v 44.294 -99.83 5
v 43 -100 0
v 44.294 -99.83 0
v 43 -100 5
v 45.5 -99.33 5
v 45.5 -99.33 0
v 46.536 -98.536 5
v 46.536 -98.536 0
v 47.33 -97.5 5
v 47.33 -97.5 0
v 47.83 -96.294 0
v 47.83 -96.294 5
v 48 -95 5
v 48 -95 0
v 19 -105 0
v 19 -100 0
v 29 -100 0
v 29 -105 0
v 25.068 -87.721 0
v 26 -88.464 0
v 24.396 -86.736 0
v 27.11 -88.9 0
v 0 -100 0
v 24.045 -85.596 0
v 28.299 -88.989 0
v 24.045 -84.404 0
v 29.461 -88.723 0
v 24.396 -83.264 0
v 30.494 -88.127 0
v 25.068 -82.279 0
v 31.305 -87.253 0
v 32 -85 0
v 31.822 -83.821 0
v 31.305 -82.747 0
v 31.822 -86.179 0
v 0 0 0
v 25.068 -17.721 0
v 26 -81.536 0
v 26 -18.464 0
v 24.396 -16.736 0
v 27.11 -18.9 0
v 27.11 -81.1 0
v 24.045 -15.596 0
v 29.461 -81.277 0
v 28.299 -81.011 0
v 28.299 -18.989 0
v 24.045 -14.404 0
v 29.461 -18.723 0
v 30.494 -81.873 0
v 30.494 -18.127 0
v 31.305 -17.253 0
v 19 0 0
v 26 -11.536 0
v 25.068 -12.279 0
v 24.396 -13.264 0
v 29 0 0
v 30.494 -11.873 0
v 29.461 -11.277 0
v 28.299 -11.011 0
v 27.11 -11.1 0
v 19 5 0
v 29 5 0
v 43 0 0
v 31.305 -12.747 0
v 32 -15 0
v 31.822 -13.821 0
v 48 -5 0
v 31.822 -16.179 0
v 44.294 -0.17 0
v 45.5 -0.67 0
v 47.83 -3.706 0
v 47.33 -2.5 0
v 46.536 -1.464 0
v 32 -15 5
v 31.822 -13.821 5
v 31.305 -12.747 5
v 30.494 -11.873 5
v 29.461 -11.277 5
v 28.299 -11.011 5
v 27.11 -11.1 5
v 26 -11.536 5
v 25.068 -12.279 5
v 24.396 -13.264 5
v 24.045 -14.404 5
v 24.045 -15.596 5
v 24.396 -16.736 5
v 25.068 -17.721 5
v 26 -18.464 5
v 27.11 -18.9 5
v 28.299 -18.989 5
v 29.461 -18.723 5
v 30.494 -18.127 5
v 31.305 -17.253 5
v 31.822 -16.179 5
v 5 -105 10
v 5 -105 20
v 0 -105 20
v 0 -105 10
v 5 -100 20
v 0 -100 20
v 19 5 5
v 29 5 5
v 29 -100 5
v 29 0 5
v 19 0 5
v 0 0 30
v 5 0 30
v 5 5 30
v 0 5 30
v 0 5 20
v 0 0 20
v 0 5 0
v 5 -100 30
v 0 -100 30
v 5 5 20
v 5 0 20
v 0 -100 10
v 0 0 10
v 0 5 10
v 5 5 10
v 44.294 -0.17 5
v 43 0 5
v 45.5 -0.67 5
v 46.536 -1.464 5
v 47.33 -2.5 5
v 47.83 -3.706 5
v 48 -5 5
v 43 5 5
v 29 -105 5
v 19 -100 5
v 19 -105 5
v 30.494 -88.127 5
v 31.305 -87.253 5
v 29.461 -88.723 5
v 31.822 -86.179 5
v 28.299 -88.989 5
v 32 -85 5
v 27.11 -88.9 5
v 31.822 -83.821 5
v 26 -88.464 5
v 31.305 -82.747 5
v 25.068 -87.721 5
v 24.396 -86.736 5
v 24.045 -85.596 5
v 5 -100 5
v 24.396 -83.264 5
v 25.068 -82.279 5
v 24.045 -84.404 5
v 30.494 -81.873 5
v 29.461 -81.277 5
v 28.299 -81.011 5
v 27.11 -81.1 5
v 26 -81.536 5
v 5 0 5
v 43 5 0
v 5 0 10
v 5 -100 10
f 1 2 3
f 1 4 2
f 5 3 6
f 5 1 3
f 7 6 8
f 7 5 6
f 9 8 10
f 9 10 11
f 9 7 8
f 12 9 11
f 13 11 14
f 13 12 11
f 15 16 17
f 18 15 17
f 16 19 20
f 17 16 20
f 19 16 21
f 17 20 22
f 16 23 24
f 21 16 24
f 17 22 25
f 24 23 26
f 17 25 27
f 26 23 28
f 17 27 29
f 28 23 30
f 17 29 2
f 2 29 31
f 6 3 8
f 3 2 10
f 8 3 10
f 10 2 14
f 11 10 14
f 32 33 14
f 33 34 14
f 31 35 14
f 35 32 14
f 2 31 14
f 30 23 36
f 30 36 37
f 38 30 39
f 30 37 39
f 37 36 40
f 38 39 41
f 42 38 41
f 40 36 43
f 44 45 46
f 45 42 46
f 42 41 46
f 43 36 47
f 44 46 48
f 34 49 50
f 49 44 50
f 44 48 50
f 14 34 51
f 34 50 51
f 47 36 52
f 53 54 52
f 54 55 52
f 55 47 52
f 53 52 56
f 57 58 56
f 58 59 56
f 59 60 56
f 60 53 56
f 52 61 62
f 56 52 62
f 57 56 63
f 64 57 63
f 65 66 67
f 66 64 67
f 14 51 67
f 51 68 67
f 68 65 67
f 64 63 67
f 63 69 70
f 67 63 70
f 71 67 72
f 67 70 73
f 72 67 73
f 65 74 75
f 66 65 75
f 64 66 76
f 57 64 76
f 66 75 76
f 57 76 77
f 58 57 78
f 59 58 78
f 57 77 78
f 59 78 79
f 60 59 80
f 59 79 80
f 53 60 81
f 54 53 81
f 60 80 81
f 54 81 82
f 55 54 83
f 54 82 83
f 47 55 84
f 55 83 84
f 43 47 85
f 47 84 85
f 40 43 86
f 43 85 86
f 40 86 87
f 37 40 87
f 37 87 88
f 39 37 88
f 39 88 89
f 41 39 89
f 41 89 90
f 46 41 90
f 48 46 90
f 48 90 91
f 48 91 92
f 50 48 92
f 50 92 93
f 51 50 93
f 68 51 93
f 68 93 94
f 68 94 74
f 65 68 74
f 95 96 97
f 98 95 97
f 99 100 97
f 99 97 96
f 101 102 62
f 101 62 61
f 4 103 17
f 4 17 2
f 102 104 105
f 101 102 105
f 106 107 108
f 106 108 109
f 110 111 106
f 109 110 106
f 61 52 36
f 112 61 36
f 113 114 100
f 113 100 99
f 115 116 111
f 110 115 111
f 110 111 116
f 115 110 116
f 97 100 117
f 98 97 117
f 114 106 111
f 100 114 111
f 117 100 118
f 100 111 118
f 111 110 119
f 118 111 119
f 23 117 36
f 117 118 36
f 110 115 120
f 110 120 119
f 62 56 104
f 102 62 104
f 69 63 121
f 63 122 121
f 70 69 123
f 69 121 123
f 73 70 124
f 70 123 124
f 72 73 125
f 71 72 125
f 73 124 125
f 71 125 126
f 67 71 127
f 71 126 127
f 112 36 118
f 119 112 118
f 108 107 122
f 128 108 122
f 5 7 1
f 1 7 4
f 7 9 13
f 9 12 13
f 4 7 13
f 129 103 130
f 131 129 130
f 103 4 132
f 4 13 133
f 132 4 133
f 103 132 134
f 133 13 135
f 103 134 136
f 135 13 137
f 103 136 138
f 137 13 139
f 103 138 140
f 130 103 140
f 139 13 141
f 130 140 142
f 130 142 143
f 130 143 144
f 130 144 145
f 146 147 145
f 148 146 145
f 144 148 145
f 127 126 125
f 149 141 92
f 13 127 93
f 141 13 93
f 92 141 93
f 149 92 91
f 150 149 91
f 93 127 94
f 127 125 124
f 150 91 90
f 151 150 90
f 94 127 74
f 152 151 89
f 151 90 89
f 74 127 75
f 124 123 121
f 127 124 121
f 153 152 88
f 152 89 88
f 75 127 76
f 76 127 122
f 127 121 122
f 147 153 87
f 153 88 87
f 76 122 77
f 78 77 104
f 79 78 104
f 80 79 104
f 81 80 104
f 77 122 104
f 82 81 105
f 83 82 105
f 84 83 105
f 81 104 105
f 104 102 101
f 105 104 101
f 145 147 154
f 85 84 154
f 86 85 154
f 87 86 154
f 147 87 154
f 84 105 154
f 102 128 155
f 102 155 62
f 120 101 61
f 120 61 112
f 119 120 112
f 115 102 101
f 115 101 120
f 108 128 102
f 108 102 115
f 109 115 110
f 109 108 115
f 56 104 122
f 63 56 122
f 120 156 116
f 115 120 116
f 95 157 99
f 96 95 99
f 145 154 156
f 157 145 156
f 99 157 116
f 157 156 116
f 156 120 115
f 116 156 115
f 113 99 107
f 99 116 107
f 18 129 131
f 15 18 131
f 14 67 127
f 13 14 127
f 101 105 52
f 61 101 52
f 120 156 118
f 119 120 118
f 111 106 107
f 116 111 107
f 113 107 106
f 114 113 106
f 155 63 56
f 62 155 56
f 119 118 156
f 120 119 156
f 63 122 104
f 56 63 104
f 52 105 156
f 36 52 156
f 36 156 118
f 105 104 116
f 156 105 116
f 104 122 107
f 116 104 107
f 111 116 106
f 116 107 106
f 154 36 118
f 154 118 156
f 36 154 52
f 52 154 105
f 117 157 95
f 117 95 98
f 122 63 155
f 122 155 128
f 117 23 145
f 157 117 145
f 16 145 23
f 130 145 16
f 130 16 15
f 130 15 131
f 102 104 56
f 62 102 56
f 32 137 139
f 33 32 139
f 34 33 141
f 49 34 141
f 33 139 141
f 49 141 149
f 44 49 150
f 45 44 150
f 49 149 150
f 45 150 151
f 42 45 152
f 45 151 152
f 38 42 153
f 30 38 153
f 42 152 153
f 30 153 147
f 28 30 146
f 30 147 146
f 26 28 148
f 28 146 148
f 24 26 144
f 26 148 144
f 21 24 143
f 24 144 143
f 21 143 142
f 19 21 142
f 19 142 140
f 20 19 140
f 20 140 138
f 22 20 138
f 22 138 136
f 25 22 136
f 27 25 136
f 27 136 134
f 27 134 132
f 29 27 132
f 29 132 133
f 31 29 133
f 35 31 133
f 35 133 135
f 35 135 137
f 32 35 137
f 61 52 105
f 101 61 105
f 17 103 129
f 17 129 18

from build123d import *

# Parameters (mm, degrees)
F1_DEPTH = 100
F2_R     = 4
F3_DEPTH = 25
F4_R     = 5
F6_DEPTH = 5
F8_W     = 5
F8_H     = 10
F8_W_2   = 14
F8_H_2   = 5
F9_DEPTH = 5


# Not quite as in the source:
# - a pattern or mirror of a feature is missing from the dataset's text; its kind, count and spacing are read off the source's solid


with BuildPart() as f1:
    # F0 (on Front) → F1 (new body)
    with BuildSketch(Plane.XZ):
        Polygon((0, 30), (0, 0), (48, 0), (48, 5), (5, 5), (5, 30), align=None)
    extrude(amount=F1_DEPTH)

    # F2 (on face) → F3 (cut)
    with BuildSketch(Plane.XY.offset(5)):
        with Locations((28, -85)):
            Circle(F2_R)
        with Locations((28, -15)):
            Circle(F2_R)
    extrude(amount=-F3_DEPTH, mode=Mode.SUBTRACT)

    # F4
    f4_edges = [f1.edges().sort_by_distance(p)[0] for p in [
        (48, -100, 2.5),
        (48, 0, 2.5),
    ]]
    fillet(f4_edges, radius=F4_R)

    # F5 (on face) → F6 (join)
    with BuildSketch(Plane(origin=(0, 0, 0), x_dir=(-1, 0, 0), z_dir=(0, 1, 0))):
        Polygon((0, 10), (0, 15), (0, 20), (-5, 20), (-5, 10), align=None)
        Polygon((-19, 5), (-24, 5), (-29, 5), (-29, 0), (-19, 0), align=None)
    f6 = extrude(amount=F6_DEPTH)

    # F6_copies: F6 across plane
    add(f6.mirror(Plane(origin=(0, -50, 0), x_dir=(0, 0, -1), z_dir=(0, -1, 0))))


with BuildPart() as f9:
    # F8 (on face) → F9 (new body)
    with BuildSketch(Plane(origin=(0, 0, 0), x_dir=(-1, 0, 0), z_dir=(0, 1, 0))):
        Polygon((-5, 20), (-5, 30), (-43, 5), (-29, 5), (-19, 5), (-5, 5), (-5, 10), align=None)
        with Locations((-2.5, 25)):
            Rectangle(F8_W, F8_H)
        Polygon((0, 10), (-5, 10), (-5, 5), (-19, 5), (-19, 0), (0, 0), align=None)
        with Locations((-36, 2.5)):
            Rectangle(F8_W_2, F8_H_2)
    extrude(amount=F9_DEPTH)


solid = Compound([f1.part, f9.part])
